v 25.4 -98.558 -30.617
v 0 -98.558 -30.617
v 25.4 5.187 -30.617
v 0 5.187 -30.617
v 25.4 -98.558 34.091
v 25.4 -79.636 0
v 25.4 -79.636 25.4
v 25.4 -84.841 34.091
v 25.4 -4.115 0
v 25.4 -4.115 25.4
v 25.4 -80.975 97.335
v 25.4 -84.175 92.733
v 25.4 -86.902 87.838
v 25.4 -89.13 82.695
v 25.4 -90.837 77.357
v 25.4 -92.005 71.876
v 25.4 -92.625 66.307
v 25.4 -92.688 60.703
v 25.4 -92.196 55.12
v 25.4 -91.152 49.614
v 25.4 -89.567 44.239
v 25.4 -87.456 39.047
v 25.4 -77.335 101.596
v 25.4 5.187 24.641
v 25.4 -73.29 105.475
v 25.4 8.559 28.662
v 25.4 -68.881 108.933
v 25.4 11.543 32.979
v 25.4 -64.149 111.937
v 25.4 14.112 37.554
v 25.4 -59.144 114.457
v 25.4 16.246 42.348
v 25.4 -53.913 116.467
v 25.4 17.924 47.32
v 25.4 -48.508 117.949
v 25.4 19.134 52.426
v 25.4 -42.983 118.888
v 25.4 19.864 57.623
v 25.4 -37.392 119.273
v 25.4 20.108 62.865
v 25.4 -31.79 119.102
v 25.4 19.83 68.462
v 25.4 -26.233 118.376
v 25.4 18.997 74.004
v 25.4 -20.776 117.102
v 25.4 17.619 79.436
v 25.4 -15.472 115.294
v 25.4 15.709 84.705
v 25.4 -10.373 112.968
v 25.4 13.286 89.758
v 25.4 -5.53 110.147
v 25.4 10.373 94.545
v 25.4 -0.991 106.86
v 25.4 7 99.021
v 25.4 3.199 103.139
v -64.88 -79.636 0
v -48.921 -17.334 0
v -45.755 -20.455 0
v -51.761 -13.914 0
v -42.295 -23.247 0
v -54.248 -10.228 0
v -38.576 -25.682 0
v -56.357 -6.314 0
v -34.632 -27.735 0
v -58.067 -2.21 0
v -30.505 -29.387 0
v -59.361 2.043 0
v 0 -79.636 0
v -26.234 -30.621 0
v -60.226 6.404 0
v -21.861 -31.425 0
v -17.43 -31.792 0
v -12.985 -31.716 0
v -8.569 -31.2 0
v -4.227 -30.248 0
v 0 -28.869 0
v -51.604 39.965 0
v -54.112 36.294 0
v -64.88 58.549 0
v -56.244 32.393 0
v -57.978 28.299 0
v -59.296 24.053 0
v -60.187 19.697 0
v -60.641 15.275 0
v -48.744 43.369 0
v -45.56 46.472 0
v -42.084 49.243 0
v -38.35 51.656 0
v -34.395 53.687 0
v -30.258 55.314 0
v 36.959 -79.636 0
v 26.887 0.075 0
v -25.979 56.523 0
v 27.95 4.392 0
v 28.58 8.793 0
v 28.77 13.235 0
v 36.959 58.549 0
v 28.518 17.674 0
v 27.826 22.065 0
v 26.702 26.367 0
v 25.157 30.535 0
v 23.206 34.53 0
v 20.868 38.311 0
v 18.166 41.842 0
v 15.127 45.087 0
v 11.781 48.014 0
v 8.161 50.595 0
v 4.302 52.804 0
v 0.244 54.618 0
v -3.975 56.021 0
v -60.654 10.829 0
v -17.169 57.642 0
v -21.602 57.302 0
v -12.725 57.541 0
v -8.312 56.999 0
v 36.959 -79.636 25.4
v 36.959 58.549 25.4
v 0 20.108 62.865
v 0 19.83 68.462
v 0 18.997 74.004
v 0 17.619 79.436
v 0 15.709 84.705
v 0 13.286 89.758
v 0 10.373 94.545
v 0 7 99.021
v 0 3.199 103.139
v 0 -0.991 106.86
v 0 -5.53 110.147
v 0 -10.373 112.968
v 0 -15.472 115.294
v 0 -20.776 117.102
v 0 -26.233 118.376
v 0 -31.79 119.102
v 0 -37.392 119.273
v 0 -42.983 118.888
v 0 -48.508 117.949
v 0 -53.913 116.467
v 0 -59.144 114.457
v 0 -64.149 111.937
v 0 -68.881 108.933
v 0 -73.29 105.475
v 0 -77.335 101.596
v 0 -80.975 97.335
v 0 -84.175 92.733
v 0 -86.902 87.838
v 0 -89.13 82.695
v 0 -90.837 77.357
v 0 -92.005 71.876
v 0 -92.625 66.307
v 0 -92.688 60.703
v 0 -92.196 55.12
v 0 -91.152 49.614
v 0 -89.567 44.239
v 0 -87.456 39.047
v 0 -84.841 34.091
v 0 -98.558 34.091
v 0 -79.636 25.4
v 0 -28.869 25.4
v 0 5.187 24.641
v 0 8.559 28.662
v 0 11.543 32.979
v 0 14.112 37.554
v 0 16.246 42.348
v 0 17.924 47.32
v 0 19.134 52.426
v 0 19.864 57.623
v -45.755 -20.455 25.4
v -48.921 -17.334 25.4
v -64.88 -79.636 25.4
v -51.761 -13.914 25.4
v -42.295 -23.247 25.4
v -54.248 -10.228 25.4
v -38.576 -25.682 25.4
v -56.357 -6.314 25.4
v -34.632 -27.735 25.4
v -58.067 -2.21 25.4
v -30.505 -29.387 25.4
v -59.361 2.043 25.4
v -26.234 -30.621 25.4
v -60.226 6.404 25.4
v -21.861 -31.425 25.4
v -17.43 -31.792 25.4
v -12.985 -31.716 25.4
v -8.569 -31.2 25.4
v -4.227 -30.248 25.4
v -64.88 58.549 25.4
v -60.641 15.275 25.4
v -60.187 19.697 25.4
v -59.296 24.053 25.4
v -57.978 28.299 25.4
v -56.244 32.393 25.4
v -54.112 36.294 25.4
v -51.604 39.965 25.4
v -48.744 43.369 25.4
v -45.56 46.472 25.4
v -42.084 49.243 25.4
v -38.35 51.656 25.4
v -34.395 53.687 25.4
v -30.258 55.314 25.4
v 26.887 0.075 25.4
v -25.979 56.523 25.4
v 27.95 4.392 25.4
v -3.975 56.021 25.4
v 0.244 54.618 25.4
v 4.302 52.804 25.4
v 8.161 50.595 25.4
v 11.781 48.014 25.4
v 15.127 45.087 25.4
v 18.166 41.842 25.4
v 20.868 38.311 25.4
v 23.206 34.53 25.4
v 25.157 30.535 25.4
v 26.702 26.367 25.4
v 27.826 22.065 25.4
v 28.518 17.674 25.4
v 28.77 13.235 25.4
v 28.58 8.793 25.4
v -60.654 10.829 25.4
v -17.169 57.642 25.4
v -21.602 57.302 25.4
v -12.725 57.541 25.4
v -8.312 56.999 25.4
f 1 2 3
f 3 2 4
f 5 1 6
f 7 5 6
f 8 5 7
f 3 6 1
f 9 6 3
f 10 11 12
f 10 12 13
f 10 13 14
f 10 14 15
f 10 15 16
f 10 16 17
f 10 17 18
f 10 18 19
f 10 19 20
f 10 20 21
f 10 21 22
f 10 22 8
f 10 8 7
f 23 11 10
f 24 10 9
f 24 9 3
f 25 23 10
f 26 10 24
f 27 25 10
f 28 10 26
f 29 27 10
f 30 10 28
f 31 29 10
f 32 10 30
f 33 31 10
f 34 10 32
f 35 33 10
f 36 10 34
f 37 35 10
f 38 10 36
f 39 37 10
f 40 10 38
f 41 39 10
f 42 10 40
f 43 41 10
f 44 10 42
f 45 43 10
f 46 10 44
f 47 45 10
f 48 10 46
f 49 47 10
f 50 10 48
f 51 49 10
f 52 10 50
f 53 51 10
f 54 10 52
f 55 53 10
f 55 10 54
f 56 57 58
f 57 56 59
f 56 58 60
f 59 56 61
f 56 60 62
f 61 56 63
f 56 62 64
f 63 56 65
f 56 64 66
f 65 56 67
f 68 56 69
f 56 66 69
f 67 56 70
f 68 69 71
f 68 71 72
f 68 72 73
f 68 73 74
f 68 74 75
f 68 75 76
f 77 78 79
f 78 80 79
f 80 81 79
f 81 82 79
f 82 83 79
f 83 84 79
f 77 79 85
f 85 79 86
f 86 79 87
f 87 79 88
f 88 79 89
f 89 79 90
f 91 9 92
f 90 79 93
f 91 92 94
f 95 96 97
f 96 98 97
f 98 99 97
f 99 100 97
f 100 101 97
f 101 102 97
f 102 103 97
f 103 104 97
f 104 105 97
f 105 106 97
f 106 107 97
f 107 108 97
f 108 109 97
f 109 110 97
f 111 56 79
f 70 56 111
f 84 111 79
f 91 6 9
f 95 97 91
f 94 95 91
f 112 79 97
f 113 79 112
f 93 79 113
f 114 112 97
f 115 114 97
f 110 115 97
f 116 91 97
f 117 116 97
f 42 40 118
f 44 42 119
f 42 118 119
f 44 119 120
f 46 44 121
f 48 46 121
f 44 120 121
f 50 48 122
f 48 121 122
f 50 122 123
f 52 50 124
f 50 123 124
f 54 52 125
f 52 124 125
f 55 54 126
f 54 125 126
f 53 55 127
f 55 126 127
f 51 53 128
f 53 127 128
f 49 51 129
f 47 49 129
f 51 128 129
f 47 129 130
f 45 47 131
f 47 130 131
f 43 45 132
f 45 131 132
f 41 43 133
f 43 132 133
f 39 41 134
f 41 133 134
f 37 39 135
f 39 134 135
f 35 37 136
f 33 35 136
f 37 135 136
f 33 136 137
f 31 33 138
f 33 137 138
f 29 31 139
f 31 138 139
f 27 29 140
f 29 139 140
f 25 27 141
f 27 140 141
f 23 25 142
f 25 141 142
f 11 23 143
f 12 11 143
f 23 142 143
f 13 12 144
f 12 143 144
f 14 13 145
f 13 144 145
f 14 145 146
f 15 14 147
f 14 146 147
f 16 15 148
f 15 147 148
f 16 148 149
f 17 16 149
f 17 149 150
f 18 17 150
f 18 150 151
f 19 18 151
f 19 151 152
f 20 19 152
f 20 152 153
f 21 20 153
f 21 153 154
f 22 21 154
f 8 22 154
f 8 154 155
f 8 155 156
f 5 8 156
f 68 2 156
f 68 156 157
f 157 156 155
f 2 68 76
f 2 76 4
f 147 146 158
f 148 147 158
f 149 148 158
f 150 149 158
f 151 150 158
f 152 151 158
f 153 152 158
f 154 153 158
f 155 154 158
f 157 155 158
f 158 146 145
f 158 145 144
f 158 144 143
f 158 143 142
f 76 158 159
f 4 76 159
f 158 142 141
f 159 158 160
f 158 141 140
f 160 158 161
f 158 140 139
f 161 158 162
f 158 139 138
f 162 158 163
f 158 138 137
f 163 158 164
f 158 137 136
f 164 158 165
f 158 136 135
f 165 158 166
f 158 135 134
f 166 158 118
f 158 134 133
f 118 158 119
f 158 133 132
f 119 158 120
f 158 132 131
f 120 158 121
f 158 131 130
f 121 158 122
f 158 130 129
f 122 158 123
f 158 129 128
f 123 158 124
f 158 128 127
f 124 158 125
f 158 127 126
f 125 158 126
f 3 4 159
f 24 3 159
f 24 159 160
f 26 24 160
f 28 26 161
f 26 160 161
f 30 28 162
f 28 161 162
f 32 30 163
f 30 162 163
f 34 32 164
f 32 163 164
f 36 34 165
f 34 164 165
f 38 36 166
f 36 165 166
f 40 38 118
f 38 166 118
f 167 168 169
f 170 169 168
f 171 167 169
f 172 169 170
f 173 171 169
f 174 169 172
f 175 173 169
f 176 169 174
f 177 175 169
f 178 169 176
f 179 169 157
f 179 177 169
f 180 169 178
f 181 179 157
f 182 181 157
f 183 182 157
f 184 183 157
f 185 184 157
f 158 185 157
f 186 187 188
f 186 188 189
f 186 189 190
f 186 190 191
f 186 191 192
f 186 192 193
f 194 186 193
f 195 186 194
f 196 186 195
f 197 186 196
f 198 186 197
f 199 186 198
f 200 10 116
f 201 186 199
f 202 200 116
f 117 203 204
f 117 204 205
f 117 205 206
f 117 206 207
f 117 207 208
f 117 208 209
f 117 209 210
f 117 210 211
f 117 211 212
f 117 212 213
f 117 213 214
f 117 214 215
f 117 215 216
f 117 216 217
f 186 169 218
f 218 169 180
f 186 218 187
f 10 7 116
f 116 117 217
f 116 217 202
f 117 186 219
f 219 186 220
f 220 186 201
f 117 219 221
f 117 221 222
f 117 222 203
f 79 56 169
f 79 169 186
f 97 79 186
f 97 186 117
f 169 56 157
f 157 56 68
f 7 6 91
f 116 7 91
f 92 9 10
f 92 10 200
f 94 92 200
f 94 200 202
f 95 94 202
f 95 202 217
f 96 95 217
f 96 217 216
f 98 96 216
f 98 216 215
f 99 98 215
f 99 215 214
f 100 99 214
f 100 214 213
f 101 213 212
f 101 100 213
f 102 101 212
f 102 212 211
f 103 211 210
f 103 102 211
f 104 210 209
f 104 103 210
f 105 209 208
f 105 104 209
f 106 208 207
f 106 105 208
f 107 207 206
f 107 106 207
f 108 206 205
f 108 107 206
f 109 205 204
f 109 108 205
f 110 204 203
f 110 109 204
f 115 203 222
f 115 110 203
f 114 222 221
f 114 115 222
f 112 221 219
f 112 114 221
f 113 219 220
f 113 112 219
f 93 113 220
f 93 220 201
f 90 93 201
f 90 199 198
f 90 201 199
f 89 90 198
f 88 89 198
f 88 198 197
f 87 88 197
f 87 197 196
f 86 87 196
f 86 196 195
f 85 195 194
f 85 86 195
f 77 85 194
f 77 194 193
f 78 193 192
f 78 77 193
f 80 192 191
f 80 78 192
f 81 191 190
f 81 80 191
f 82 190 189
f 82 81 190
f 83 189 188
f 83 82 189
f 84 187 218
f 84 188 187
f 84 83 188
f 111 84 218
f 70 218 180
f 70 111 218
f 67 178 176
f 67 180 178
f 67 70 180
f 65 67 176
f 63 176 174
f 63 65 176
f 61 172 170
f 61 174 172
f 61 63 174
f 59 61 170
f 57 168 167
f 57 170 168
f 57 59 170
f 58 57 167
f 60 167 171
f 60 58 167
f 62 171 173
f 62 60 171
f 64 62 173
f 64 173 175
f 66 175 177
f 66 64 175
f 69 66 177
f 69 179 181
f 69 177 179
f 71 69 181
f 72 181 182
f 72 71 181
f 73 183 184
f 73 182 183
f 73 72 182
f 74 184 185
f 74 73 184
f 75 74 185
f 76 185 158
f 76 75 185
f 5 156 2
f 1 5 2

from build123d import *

# Parameters (mm, degrees)
F2_DEPTH = 25.4
F0_W     = 101.8392853439
F0_H     = 138.1853856146
F0_R     = 44.7370158625
F3_DEPTH = 25.4


with BuildPart() as f2:
    # F1 (on Right) → F2 (new body)
    with BuildSketch(Plane.YZ):
        with BuildLine():
            ThreePointArc((5.1872688346, 24.6414919816), (16.2456525152, 42.3484863922), (20.1080592166, 62.8645122051))
            ThreePointArc((20.1080592166, 62.8645122051), (-51.2286548469, 117.2754631001), (-84.8408640002, 34.0907424688))
            Line((-84.8408640002, 34.0907424688), (5.1872688346, 34.0907424688))
            Line((5.1872688346, 34.0907424688), (5.1872688346, 24.6414919816))
        make_face()
        with BuildLine():
            Line((5.1872688346, 34.0907424688), (-84.8408640002, 34.0907424688))
            ThreePointArc((-84.8408640002, 34.0907424688), (-42.2001575317, 6.7538301414), (5.1872688346, 24.6414919816))
            Line((5.1872688346, 24.6414919816), (5.1872688346, 34.0907424688))
        make_face()
        with BuildLine():
            ThreePointArc((5.1872688346, 24.6414919816), (-42.2001575317, 6.7538301414), (-84.8408640002, 34.0907424688))
            Line((-84.8408640002, 34.0907424688), (-98.5580086708, 34.0907424688))
            Line((-98.5580086708, 34.0907424688), (-98.5580086708, -30.617037788))
            Line((-98.5580086708, -30.617037788), (5.1872688346, -30.617037788))
            Line((5.1872688346, -30.617037788), (5.1872688346, 24.6414919816))
        make_face()
    extrude(amount=F2_DEPTH)

    # F0 (on Top) → F3 (join)
    with BuildSketch(Plane.XY):
        with Locations((-13.9607731253, -10.5434413999)):
            Rectangle(F0_W, F0_H)
        with Locations((-15.9663036466, 12.9214562476)):
            Circle(F0_R, mode=Mode.SUBTRACT)
    extrude(amount=F3_DEPTH)


solid = f2.part
